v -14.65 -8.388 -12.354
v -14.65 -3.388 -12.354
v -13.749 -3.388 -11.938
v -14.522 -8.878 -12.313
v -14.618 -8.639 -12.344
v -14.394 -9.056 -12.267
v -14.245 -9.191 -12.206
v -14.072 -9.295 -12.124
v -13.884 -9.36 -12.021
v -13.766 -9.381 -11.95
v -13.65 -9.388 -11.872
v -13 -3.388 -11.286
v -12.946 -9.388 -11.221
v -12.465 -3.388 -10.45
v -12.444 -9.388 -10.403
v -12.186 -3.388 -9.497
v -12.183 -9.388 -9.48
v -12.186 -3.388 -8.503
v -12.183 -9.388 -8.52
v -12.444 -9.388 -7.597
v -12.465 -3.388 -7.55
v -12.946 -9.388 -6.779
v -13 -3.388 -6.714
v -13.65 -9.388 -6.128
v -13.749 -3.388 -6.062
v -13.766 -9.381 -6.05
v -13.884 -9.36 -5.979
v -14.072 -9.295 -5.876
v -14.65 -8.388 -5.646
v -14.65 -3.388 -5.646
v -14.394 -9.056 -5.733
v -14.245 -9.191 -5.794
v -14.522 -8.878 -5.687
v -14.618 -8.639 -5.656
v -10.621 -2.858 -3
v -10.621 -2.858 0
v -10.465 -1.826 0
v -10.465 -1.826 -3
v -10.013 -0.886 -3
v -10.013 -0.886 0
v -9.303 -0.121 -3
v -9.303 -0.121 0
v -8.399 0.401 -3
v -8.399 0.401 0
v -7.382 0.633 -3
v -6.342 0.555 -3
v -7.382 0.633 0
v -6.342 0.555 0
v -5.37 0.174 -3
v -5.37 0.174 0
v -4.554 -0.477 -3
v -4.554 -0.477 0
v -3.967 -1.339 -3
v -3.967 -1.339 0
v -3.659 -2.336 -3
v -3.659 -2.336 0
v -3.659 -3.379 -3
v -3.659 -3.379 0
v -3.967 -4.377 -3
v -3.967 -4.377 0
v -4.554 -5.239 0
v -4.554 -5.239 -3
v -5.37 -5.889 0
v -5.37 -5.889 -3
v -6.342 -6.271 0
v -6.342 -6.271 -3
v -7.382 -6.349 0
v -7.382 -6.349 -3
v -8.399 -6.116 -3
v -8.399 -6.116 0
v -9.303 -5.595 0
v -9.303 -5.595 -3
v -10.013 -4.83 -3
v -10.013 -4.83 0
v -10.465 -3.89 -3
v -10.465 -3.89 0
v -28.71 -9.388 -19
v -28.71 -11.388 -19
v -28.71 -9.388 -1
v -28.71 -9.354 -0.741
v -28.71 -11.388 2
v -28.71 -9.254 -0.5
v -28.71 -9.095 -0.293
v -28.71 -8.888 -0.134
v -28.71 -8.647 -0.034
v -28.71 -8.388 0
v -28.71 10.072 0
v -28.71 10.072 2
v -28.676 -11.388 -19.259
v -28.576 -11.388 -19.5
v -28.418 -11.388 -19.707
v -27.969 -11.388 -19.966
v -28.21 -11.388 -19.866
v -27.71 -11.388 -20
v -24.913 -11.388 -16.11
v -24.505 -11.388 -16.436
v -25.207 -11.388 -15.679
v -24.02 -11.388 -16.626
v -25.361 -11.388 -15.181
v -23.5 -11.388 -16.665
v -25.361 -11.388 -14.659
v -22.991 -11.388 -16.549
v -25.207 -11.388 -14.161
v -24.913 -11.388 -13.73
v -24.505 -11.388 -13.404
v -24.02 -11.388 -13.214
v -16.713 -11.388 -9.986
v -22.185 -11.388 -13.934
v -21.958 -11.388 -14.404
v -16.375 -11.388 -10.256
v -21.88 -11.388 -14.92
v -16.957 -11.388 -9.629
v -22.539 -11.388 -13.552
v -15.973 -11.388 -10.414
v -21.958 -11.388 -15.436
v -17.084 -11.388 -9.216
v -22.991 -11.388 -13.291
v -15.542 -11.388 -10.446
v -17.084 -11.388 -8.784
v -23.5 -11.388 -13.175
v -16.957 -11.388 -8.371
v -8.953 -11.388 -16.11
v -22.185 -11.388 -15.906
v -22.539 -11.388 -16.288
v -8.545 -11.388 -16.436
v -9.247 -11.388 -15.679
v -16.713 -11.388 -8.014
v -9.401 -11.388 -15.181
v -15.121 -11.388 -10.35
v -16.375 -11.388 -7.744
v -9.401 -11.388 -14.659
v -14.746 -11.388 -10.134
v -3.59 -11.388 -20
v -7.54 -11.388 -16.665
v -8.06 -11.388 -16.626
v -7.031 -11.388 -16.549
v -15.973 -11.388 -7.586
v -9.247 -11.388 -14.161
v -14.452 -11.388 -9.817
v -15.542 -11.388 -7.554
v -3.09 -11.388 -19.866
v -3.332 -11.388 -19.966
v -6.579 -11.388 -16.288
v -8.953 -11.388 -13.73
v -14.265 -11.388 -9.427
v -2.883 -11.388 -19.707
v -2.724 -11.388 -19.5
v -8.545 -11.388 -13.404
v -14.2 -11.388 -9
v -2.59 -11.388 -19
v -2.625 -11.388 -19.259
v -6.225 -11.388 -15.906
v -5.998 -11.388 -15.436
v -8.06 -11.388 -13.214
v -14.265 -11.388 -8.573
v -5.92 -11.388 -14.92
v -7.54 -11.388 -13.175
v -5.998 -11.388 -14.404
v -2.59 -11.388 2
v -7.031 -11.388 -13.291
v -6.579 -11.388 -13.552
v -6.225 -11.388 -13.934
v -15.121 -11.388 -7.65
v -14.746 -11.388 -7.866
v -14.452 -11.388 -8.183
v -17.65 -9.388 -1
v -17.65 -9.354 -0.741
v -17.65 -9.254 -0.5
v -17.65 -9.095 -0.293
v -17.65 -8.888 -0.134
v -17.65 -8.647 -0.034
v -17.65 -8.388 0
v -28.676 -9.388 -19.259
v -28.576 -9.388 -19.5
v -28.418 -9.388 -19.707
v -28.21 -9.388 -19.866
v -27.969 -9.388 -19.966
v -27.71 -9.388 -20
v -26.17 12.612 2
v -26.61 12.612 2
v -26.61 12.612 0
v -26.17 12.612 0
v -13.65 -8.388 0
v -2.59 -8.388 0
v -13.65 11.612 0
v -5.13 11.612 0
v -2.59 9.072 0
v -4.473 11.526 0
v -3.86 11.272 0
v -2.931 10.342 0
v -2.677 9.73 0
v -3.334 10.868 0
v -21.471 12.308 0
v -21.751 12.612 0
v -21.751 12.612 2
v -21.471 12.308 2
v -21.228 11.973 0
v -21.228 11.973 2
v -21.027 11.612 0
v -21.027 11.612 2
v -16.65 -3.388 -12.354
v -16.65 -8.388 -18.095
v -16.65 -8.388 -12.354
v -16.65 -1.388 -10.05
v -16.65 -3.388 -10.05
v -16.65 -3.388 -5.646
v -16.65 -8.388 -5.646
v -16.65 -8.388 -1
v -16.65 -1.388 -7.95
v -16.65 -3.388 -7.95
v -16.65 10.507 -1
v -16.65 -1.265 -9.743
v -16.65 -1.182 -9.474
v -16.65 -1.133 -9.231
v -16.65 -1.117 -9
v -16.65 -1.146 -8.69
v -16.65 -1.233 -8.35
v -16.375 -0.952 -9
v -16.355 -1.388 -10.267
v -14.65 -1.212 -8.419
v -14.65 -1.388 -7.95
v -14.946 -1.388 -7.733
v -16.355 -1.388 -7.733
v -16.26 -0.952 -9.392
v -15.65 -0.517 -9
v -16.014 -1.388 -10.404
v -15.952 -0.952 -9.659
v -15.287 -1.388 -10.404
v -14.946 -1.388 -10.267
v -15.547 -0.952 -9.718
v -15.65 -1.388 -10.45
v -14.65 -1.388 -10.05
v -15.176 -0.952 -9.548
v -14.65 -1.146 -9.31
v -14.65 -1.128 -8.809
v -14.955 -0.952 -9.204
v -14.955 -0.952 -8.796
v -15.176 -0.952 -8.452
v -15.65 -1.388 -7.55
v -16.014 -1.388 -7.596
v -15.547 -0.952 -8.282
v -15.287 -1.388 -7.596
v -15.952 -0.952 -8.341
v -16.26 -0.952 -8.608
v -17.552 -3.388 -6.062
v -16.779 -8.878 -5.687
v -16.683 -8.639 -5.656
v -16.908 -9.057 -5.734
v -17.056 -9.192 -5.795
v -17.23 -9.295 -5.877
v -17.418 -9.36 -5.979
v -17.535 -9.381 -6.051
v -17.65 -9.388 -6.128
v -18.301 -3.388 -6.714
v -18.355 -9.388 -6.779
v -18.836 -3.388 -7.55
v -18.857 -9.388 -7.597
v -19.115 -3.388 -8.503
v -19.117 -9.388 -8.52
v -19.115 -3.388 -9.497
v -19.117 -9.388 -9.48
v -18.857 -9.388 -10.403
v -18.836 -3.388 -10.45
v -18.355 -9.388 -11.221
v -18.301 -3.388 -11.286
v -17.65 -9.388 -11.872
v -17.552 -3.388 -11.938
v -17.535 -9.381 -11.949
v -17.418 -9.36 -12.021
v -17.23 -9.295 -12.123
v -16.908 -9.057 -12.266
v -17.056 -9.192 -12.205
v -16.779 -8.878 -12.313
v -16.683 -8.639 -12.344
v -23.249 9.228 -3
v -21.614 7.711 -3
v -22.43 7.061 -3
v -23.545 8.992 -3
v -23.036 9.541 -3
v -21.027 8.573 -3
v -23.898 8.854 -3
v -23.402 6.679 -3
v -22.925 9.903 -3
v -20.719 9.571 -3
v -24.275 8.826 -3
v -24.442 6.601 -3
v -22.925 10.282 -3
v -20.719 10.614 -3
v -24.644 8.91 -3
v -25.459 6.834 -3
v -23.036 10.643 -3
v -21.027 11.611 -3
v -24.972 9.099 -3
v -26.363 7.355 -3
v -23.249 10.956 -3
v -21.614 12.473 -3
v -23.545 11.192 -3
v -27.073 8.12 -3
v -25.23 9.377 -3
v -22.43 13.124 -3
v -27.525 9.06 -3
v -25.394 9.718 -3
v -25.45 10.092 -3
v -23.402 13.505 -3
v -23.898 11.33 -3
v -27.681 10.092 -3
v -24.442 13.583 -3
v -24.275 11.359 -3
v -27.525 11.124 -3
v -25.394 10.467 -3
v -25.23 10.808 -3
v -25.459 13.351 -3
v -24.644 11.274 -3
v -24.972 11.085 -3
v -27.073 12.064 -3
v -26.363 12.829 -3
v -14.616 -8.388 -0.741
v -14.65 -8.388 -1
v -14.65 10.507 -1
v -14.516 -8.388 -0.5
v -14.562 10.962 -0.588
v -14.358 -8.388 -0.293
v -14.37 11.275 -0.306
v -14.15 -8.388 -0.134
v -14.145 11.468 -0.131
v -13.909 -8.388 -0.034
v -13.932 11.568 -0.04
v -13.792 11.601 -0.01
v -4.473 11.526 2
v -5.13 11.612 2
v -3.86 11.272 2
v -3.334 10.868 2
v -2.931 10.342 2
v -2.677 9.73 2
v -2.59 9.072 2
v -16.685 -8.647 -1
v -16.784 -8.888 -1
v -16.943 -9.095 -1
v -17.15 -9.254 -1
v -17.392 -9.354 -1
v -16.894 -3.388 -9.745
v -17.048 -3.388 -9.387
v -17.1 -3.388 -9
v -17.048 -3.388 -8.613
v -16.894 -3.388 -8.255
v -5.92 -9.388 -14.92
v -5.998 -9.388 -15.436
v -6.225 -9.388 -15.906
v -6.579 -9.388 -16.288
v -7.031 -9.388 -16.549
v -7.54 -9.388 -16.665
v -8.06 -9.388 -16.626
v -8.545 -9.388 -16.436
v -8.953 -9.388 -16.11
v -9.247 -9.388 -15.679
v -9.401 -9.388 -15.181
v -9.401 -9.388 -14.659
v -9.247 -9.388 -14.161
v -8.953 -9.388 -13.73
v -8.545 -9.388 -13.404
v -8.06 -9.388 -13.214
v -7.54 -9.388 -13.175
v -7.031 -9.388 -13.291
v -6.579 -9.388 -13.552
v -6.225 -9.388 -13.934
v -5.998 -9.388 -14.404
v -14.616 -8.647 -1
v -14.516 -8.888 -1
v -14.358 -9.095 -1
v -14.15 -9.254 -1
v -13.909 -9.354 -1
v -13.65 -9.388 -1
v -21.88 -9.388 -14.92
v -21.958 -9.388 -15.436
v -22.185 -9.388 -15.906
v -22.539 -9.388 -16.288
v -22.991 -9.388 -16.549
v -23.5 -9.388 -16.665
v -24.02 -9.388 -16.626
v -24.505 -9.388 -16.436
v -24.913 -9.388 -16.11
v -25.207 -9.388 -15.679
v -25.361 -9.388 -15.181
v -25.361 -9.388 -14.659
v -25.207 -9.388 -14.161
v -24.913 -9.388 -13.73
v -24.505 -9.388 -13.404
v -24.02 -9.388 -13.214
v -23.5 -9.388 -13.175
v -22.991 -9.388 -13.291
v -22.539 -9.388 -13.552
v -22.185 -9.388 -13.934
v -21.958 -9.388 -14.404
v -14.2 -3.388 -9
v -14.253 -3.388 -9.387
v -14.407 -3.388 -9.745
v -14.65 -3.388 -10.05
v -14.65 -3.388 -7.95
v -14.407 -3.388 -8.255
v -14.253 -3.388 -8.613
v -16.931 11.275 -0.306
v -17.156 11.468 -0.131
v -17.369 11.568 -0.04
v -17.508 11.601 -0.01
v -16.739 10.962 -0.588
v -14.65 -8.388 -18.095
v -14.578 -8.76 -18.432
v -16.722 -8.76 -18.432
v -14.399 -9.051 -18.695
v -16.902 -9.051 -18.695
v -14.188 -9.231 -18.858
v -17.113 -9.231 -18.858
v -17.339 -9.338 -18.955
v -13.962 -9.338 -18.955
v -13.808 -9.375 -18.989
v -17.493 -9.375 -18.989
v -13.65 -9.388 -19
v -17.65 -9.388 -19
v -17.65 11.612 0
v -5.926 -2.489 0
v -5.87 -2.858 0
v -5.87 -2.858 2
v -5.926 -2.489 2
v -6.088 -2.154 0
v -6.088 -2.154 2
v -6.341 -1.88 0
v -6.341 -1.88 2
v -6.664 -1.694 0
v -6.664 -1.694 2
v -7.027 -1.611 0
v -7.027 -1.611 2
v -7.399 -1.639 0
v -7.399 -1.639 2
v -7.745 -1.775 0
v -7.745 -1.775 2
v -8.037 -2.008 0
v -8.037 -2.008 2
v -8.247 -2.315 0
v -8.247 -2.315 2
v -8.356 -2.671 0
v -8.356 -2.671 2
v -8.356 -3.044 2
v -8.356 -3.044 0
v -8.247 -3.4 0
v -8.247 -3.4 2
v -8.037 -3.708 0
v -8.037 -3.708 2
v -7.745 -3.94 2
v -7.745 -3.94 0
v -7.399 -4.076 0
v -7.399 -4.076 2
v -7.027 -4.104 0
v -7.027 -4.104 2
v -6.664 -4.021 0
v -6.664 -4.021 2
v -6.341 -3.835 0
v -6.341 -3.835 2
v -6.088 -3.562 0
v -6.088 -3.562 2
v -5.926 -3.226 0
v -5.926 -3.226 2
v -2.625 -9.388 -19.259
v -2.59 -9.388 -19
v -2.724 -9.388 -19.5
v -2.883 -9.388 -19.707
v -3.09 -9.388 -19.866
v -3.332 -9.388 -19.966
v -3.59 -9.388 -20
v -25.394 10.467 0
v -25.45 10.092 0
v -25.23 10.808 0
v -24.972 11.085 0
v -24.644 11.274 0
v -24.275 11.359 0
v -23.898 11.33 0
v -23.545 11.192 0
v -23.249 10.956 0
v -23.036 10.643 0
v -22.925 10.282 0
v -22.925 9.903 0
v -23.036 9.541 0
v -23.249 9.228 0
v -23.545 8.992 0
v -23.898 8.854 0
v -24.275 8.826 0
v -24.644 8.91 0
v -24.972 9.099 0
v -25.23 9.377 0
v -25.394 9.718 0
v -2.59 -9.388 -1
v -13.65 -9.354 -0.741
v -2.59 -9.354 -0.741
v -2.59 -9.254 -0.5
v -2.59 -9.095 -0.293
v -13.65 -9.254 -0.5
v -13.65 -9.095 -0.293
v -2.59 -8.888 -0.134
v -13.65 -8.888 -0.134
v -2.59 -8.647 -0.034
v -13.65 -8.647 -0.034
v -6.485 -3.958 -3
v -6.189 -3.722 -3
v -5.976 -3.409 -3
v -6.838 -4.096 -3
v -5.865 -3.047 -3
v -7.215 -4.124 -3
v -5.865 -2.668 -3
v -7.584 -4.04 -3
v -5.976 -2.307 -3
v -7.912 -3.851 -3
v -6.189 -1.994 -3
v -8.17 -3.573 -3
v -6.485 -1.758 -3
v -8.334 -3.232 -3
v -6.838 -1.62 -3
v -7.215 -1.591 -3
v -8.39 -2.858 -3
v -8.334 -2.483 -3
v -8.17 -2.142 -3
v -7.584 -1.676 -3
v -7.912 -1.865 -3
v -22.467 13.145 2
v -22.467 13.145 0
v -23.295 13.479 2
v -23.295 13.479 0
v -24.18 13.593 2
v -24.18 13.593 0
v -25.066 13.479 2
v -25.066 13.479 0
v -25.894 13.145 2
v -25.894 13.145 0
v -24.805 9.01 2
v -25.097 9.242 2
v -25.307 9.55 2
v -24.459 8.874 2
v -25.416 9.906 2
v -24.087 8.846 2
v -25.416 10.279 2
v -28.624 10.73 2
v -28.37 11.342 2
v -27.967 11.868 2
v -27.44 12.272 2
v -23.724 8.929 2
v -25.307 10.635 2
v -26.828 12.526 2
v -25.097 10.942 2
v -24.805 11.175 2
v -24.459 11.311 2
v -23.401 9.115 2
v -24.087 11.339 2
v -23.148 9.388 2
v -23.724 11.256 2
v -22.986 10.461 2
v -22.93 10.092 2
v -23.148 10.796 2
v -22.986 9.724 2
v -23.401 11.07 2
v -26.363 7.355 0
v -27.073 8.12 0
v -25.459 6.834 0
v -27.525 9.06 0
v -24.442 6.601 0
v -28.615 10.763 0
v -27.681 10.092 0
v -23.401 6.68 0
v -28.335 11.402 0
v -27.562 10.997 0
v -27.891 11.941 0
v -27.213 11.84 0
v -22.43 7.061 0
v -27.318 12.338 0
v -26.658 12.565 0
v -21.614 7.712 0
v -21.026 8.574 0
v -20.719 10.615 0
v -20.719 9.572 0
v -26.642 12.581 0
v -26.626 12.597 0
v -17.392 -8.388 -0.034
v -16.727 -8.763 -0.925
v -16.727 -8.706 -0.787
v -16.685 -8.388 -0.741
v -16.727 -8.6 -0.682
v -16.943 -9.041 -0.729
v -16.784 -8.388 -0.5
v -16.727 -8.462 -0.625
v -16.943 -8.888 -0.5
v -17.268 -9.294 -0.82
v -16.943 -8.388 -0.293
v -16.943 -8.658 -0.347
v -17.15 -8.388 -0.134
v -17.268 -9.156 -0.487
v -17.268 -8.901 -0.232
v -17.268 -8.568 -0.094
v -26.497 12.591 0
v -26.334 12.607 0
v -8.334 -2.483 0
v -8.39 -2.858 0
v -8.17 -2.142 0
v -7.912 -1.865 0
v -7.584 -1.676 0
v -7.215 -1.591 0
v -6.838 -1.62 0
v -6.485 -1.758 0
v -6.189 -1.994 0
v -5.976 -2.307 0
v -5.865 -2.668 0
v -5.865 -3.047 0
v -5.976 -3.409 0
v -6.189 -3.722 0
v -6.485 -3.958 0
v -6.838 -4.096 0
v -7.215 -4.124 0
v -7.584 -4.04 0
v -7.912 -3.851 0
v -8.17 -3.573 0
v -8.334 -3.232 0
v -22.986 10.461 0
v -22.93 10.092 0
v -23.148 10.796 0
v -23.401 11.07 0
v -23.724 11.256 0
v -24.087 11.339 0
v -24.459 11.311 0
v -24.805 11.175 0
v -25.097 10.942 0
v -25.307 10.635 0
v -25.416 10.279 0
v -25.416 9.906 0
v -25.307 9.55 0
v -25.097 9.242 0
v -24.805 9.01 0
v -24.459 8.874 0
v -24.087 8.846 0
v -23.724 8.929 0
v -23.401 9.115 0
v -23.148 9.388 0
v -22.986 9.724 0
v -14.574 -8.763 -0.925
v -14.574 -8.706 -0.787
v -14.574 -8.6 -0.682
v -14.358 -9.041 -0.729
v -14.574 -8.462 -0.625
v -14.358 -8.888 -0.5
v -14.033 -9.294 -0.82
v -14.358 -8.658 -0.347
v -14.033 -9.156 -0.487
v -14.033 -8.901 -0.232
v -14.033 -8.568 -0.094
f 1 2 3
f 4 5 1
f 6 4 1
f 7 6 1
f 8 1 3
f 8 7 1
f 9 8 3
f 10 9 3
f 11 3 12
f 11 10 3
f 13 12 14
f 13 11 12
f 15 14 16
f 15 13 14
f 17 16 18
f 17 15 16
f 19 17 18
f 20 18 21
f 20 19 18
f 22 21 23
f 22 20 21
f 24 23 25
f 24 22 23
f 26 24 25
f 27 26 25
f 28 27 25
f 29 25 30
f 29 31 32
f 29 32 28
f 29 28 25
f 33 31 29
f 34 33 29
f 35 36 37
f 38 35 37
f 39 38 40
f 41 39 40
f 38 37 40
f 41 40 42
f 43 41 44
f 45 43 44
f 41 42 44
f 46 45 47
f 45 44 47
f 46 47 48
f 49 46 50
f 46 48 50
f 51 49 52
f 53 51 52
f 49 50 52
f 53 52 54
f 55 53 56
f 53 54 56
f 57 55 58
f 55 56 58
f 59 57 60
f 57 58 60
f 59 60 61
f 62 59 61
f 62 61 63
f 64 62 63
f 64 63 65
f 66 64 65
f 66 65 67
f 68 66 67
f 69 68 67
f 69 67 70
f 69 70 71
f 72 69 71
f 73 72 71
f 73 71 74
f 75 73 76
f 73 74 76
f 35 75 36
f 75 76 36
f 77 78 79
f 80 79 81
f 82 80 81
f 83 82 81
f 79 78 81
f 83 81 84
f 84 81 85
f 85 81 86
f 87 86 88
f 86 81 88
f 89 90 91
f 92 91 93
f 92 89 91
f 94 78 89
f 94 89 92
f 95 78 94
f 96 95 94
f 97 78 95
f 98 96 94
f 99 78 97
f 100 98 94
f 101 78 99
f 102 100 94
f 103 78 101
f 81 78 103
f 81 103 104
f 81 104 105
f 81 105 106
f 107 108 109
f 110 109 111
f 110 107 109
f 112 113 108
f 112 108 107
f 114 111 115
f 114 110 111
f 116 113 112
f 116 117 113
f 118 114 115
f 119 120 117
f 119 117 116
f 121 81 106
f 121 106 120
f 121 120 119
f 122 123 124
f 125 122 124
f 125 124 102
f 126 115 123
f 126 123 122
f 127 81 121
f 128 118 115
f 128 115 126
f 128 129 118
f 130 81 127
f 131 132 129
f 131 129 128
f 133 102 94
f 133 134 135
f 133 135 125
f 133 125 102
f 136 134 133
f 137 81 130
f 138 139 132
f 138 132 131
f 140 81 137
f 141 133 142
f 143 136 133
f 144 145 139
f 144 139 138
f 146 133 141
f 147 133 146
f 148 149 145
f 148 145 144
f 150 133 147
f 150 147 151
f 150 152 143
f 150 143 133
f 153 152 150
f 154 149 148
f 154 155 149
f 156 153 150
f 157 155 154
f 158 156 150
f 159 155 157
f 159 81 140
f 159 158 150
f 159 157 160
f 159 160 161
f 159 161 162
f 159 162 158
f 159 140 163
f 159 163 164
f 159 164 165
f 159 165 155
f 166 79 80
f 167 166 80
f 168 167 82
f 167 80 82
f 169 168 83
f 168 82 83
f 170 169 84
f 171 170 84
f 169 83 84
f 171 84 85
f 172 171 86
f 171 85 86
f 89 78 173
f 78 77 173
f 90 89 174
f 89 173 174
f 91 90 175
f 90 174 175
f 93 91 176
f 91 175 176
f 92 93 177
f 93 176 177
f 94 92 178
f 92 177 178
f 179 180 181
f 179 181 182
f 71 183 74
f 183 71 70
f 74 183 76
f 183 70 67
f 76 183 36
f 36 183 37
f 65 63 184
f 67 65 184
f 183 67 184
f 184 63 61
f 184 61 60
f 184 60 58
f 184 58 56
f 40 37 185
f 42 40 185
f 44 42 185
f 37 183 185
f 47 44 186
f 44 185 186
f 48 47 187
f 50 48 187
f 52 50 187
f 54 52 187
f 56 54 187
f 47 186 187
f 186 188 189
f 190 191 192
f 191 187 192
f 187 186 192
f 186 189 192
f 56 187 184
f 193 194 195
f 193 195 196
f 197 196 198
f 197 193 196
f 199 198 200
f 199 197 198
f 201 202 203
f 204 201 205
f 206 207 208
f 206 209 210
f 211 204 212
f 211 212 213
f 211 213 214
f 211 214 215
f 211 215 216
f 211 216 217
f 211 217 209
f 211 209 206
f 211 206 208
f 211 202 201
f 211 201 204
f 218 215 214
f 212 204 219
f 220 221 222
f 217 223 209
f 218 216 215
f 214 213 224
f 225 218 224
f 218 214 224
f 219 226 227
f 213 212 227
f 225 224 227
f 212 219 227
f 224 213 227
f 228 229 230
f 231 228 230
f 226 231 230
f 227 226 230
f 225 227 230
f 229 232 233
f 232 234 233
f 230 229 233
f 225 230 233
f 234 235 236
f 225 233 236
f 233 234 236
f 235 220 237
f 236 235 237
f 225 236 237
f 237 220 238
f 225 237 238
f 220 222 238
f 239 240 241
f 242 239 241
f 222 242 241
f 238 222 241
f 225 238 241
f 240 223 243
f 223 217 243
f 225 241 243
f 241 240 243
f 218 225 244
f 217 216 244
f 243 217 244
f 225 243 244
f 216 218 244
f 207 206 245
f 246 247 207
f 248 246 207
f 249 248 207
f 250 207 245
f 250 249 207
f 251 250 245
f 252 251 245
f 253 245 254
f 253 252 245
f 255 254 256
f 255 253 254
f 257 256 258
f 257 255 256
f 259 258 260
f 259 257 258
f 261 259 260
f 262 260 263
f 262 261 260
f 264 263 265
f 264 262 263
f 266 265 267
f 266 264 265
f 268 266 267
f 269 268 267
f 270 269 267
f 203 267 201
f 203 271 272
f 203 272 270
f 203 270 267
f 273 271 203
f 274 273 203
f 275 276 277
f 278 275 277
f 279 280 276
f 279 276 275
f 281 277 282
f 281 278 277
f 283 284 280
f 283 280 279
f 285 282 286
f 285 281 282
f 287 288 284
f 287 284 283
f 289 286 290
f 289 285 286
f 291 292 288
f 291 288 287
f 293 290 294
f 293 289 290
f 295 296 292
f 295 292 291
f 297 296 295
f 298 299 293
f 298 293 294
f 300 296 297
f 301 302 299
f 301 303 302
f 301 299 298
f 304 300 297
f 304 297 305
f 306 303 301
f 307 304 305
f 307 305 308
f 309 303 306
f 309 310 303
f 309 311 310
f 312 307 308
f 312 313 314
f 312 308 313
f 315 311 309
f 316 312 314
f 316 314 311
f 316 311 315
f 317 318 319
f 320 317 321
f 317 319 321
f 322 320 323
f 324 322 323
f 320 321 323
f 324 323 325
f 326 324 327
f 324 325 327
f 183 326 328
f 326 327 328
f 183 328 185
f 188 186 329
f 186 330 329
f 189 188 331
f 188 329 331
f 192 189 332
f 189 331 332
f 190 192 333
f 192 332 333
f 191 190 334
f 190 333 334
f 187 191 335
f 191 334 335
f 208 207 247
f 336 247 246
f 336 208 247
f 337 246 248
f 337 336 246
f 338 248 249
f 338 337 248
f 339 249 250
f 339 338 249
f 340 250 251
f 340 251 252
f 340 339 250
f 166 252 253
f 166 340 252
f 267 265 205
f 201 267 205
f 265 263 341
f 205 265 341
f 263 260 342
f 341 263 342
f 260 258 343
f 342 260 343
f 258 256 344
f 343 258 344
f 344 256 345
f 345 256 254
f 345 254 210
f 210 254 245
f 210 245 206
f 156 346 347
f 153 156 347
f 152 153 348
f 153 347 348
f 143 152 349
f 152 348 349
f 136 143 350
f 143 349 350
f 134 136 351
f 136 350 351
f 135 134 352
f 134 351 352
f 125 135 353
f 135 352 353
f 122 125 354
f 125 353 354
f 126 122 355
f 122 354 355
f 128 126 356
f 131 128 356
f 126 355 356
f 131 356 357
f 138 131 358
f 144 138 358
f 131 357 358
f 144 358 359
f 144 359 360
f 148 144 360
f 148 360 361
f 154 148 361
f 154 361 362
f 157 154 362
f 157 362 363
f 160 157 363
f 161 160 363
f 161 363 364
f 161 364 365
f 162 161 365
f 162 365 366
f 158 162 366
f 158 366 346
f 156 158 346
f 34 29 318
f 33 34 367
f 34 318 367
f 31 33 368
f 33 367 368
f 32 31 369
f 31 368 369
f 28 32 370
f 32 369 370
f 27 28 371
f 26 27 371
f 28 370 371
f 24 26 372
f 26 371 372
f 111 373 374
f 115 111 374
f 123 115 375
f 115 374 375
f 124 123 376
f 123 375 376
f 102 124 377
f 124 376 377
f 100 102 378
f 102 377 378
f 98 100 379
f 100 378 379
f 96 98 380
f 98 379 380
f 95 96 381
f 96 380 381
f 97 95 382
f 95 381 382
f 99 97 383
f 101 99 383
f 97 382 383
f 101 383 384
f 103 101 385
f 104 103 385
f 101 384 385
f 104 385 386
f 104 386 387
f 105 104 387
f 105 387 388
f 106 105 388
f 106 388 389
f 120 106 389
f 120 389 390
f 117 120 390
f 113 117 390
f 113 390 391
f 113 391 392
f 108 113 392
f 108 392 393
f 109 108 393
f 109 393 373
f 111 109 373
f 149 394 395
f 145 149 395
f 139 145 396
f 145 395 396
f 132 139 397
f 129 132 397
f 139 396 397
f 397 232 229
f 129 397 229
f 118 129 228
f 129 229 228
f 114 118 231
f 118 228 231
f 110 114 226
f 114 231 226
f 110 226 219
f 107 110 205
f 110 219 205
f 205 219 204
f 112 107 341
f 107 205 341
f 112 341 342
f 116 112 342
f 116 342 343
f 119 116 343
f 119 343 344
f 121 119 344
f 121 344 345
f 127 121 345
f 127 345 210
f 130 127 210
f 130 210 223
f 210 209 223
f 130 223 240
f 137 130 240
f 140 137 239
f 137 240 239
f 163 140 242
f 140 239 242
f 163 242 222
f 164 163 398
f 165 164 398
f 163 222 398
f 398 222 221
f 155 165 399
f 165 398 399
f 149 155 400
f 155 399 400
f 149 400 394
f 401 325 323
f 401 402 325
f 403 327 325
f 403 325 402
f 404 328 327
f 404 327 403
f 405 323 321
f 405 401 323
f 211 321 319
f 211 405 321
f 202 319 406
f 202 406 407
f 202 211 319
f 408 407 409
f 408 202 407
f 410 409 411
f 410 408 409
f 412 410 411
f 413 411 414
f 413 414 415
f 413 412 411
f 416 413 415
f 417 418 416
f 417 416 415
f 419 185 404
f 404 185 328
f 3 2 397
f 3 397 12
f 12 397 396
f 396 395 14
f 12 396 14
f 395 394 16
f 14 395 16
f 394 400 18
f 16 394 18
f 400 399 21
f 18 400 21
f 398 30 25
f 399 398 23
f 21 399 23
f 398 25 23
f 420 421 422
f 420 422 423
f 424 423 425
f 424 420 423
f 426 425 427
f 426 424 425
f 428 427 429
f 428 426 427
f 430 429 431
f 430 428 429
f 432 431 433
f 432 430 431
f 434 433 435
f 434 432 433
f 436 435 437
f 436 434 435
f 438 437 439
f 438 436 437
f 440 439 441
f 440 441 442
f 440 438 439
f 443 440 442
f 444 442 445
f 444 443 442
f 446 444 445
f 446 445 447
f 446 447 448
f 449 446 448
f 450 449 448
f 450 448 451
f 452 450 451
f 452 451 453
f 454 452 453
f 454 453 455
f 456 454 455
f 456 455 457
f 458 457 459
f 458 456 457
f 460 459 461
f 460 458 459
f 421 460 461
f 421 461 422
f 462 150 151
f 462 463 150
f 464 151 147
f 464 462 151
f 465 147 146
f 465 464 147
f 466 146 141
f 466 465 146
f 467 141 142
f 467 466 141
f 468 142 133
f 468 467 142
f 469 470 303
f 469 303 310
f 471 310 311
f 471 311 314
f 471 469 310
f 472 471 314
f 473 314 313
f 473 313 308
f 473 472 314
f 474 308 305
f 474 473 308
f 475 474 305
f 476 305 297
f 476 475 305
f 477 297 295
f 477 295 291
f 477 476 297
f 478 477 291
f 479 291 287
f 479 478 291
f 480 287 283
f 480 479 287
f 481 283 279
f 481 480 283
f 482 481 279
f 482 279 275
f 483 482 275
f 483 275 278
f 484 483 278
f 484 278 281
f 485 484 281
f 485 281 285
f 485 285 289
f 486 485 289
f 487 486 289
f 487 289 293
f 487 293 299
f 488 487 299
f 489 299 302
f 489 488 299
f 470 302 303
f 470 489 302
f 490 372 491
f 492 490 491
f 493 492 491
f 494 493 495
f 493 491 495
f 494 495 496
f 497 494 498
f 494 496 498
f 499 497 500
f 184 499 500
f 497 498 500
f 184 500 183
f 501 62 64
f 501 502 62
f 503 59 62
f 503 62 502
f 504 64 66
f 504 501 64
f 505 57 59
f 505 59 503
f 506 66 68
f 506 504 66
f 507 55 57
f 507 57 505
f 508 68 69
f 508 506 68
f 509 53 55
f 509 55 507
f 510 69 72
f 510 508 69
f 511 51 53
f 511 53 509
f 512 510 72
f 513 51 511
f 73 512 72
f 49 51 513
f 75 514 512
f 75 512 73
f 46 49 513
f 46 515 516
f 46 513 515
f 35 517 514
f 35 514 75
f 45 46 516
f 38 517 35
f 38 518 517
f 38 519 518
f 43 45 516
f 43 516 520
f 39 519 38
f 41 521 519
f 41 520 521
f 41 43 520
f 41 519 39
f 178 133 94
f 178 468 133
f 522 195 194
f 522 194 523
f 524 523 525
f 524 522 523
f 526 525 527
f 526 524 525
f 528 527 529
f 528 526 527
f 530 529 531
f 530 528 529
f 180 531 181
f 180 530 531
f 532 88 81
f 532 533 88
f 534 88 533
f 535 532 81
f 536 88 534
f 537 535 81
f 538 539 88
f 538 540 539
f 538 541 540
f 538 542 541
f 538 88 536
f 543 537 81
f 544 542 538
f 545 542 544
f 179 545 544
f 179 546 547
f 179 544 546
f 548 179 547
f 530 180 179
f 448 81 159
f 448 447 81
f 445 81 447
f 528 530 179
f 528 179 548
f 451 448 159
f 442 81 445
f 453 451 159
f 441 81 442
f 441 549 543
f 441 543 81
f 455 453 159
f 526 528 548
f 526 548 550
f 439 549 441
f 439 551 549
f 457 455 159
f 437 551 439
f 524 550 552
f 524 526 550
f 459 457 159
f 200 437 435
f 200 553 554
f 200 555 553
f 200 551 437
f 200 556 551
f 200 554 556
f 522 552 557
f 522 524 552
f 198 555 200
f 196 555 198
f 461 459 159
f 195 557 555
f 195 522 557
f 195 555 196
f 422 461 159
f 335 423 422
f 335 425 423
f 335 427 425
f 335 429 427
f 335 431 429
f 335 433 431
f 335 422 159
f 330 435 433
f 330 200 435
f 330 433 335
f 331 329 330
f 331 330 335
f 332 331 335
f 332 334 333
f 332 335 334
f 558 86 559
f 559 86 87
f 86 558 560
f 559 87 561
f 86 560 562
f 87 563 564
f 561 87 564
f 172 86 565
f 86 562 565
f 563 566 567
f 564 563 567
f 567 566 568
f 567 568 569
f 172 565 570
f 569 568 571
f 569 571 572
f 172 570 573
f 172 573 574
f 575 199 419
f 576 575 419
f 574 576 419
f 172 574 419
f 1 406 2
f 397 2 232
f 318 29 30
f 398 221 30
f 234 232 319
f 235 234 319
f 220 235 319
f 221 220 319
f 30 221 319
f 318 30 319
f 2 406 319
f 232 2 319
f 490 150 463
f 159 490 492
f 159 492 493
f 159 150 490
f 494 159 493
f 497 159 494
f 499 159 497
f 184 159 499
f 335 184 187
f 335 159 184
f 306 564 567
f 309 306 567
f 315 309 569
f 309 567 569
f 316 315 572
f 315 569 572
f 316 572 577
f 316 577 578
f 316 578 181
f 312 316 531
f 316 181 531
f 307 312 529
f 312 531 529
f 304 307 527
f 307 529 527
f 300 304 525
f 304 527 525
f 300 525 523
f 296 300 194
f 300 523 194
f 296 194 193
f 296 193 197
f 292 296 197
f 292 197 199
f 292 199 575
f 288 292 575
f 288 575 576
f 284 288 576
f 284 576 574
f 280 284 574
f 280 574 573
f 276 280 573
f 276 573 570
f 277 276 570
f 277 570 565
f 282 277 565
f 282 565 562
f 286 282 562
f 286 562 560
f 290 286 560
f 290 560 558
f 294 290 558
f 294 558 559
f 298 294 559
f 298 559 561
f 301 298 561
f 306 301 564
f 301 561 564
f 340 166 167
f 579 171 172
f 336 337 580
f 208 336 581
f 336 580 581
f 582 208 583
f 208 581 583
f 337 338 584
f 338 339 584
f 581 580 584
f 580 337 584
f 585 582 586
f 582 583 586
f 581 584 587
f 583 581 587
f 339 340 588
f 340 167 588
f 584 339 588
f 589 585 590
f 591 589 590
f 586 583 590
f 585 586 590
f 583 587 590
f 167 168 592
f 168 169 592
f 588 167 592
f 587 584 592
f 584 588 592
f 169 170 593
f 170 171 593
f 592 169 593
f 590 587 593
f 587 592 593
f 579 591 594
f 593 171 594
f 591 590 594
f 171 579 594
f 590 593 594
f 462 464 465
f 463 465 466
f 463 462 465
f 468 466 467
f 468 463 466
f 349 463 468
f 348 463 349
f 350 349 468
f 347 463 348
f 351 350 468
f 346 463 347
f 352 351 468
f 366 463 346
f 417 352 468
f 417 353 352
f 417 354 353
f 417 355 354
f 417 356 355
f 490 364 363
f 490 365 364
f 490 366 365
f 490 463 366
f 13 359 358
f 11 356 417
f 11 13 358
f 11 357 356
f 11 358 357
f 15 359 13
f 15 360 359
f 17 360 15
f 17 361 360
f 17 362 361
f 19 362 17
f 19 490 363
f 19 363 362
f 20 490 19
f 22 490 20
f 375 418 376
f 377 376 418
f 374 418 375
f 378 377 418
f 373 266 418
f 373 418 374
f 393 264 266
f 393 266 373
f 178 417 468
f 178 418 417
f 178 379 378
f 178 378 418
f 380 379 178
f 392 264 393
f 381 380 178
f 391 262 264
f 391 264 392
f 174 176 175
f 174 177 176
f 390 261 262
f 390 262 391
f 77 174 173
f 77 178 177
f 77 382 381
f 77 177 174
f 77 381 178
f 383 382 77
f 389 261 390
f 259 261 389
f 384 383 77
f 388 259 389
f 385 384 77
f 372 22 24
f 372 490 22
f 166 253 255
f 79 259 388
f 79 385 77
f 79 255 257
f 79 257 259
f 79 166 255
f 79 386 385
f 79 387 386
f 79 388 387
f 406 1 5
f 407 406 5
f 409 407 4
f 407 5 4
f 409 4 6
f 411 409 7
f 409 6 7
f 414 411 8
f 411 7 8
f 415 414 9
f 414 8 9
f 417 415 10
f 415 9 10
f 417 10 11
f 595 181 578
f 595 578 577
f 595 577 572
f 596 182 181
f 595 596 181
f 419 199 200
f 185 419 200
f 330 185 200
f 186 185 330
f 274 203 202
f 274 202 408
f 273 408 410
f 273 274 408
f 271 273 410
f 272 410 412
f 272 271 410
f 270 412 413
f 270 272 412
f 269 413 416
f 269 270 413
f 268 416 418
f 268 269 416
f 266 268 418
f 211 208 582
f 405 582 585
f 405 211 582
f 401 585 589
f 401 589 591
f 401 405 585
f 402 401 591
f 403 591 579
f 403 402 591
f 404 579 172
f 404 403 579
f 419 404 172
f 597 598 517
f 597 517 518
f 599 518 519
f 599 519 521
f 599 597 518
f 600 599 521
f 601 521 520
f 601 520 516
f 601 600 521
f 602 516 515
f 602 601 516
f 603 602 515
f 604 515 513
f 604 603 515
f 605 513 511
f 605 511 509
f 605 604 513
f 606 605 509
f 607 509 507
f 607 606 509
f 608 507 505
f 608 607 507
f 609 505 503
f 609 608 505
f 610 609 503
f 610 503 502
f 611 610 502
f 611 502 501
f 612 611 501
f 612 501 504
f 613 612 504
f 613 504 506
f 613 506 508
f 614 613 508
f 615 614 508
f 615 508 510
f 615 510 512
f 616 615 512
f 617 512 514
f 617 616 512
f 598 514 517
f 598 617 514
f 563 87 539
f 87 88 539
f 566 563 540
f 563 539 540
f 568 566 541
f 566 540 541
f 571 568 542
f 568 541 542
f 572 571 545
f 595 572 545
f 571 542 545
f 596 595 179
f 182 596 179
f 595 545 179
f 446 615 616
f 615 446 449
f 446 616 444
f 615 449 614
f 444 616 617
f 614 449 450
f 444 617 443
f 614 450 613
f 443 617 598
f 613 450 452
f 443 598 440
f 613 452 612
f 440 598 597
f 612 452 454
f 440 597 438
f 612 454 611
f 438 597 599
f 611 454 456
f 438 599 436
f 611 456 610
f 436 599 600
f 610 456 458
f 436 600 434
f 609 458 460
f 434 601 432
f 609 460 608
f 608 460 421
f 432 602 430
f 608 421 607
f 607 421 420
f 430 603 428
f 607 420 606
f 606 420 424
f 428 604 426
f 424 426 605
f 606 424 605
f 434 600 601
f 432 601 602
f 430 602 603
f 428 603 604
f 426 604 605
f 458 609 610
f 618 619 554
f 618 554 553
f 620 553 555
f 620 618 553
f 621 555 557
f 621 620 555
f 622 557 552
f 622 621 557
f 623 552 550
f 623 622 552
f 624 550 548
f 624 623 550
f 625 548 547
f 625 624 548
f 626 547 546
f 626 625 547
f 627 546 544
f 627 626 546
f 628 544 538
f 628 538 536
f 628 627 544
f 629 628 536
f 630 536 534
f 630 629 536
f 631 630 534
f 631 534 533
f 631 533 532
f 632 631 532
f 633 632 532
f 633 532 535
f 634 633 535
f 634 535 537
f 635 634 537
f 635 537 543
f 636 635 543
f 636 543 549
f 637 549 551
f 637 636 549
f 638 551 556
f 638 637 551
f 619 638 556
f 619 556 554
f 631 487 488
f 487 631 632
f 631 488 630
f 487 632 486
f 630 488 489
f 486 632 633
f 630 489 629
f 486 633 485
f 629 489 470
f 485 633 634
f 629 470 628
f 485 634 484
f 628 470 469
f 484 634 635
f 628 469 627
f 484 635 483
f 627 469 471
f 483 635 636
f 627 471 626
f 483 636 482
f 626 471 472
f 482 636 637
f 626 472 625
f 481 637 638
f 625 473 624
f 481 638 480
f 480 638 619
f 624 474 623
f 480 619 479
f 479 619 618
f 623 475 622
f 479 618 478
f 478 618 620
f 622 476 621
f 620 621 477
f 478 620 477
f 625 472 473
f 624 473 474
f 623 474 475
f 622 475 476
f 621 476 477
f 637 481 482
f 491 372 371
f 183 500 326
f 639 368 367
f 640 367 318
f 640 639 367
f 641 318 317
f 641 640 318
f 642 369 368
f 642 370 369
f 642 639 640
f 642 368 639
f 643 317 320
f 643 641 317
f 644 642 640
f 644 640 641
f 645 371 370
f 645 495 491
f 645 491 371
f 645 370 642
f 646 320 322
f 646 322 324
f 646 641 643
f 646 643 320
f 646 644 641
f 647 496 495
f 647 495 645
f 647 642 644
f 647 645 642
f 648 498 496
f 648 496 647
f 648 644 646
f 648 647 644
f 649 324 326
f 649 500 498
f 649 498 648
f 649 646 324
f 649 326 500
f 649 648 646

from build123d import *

# Parameters (mm, degrees)
SKETCH1_W                   = 26.12
SKETCH1_H                   = 24
SKETCH1_R                   = 1.25
BOSS_EXTRUDE1_DEPTH         = 2
SKETCH4_W                   = 26.12
SKETCH4_H                   = 2
BOSS_EXTRUDE4_DEPTH         = 20
FILLET2_R                   = 2.54
FILLET3_R                   = 1
FILLET4_R                   = 1
FILLET5_R                   = 1
BOSS_EXTRUDE5_DEPTH         = 2
BOSS_EXTRUDE6_DEPTH         = 1
FILLET10_R                  = 1
SKETCH15_R                  = 3.5
BOSS_EXTRUDE7_DEPTH         = 8
M3_5X0_6_TAPPED_HOLE1_D     = 2.9
M3_5X0_6_TAPPED_HOLE1_DEPTH = 10
M3_5X0_6_TAPPED_HOLE1_TIP   = 0.871247898
SKETCH19_R                  = 3.500559702
SKETCH19_R_2                = 1.27
BOSS_EXTRUDE8_DEPTH         = 3
CUT_EXTRUDE1_DEPTH          = 3
FILLET11_R                  = 2.54
SKETCH21_R                  = 1.75
CUT_EXTRUDE2_DEPTH          = 3


with BuildPart() as part:
    # Sketch1 → Boss-Extrude1 (new body)
    with BuildSketch(Plane.XY):
        with Locations((-15.65045068, 0.61225)):
            Rectangle(SKETCH1_W, SKETCH1_H)
        with Locations((-7.12045068, -2.85775)):
            Circle(SKETCH1_R, mode=Mode.SUBTRACT)
        with Locations((-24.18045068, 10.09225)):
            Circle(SKETCH1_R, mode=Mode.SUBTRACT)
    extrude(amount=BOSS_EXTRUDE1_DEPTH)

    # Sketch4 → Boss-Extrude4 (add)
    with BuildSketch(Plane(origin=(0, 0, 0), x_dir=(-1, 0, 0), z_dir=(0, 0, -1))):
        with Locations((15.65045068, -10.38775)):
            Rectangle(SKETCH4_W, SKETCH4_H)
    extrude(amount=BOSS_EXTRUDE4_DEPTH)

    # Fillet2
    fillet2_edges = [part.edges().sort_by_distance(p)[0] for p in [
        (-28.71045068, 12.61225, 1),
    ]]
    fillet(fillet2_edges, radius=FILLET2_R)

    # Fillet3
    fillet3_edges = [part.edges().sort_by_distance(p)[0] for p in [
        (-2.59045068, 12.61225, 1),
    ]]
    fillet(fillet3_edges, radius=FILLET3_R)

    # Fillet4
    fillet4_edges = [part.edges().sort_by_distance(p)[0] for p in [
        (-28.71045068, -10.38775, -20),
        (-2.59045068, -10.38775, -20),
    ]]
    fillet(fillet4_edges, radius=FILLET4_R)

    # Fillet5
    fillet5_edges = [part.edges().sort_by_distance(p)[0] for p in [
        (-15.65045068, -9.38775, 0),
    ]]
    fillet(fillet5_edges, radius=FILLET5_R)

    # Sketch7 → Boss-Extrude5 (add)
    with BuildSketch(Plane.XY.offset(2)):
        with BuildLine():
            Line((-26.610166349, 12.61225), (-21.750735012, 12.61225))
            ThreePointArc((-21.750735012, 12.61225), (-24.18045068, 13.592809702), (-26.610166349, 12.61225))
        make_face()
    extrude(amount=-BOSS_EXTRUDE5_DEPTH)

    # Sketch14 → Boss-Extrude6 (add, symmetric)
    with BuildSketch(Plane.ZY.offset(15.65045068)):
        Polygon((0, 11.61225), (-19, -9.38775), (0, -9.38775), (0, 11.544281389), align=None)
    extrude(amount=BOSS_EXTRUDE6_DEPTH, both=True)

    # Fillet10
    fillet10_edges = [part.edges().sort_by_distance(p)[0] for p in [
        (-14.65045068, -9.094856781, -0.292893219),
        (-16.65045068, -9.094856781, -0.292893219),
        (-14.65045068, 1.61225, 0),
        (-16.65045068, 1.61225, 0),
        (-16.65045068, -9.38775, -10),
        (-14.65045068, -9.38775, -10),
    ]]
    fillet(fillet10_edges, radius=FILLET10_R)

    # Sketch15 → Boss-Extrude7 (add)
    with BuildSketch(Plane.XZ.offset(11.38775)):
        with Locations((-15.65045068, -9)):
            Circle(SKETCH15_R)
    extrude(amount=-BOSS_EXTRUDE7_DEPTH)

    # M3.5x0.6 Tapped Hole1
    with Locations(Plane(origin=(0, -11.38775, 0), x_dir=(-1, 0, 0), z_dir=(0, -1, 0))):
        with Locations((15.65045068, 9)):
            Hole(M3_5X0_6_TAPPED_HOLE1_D / 2, depth=M3_5X0_6_TAPPED_HOLE1_DEPTH)
            with Locations((0, 0, -(M3_5X0_6_TAPPED_HOLE1_DEPTH + M3_5X0_6_TAPPED_HOLE1_TIP / 2))):  # 118° drill point
                Cone(0, M3_5X0_6_TAPPED_HOLE1_D / 2, M3_5X0_6_TAPPED_HOLE1_TIP, mode=Mode.SUBTRACT)

    # Sketch19 → Boss-Extrude8 (add)
    with BuildSketch(Plane(origin=(0, 0, 0), x_dir=(-1, 0, 0), z_dir=(0, 0, -1))):
        with Locations((7.12045068, -2.85775)):
            Circle(SKETCH19_R)
        with Locations((7.12045068, -2.85775)):
            Circle(SKETCH19_R_2, mode=Mode.SUBTRACT)
        with Locations((24.18045068, 10.09225)):
            Circle(SKETCH19_R)
        with Locations((24.18045068, 10.09225)):
            Circle(SKETCH19_R_2, mode=Mode.SUBTRACT)
    extrude(amount=BOSS_EXTRUDE8_DEPTH)

    # Sketch20 → Cut-Extrude1 (cut, through all)
    with BuildSketch(Plane(origin=(0, 0, 0), x_dir=(-1, 0, 0), z_dir=(0, 0, -1))):
        with BuildLine():
            Line((21.027116218, 11.61225), (2.59045068, 11.61225))
            Line((2.59045068, 11.61225), (2.59045068, 12.61225))
            Line((2.59045068, 12.61225), (21.750735012, 12.61225))
            ThreePointArc((21.750735012, 12.61225), (21.344500718, 12.144396691), (21.027116218, 11.61225))
        make_face()
    extrude(amount=-CUT_EXTRUDE1_DEPTH, mode=Mode.SUBTRACT)

    # Fillet11
    fillet11_edges = [part.edges().sort_by_distance(p)[0] for p in [
        (-2.59045068, 11.61225, 1),
    ]]
    fillet(fillet11_edges, radius=FILLET11_R)

    # Sketch21 → Cut-Extrude2 (cut, through all)
    with BuildSketch(Plane(origin=(0, -9.38775, 0), x_dir=(1, 0, 0), z_dir=(0, 1, 0))):
        with Locations((-23.63045068, 14.92)):
            Circle(SKETCH21_R)
        with Locations((-7.67045068, 14.92)):
            Circle(SKETCH21_R)
    extrude(amount=-CUT_EXTRUDE2_DEPTH, mode=Mode.SUBTRACT)


solid = part.part
